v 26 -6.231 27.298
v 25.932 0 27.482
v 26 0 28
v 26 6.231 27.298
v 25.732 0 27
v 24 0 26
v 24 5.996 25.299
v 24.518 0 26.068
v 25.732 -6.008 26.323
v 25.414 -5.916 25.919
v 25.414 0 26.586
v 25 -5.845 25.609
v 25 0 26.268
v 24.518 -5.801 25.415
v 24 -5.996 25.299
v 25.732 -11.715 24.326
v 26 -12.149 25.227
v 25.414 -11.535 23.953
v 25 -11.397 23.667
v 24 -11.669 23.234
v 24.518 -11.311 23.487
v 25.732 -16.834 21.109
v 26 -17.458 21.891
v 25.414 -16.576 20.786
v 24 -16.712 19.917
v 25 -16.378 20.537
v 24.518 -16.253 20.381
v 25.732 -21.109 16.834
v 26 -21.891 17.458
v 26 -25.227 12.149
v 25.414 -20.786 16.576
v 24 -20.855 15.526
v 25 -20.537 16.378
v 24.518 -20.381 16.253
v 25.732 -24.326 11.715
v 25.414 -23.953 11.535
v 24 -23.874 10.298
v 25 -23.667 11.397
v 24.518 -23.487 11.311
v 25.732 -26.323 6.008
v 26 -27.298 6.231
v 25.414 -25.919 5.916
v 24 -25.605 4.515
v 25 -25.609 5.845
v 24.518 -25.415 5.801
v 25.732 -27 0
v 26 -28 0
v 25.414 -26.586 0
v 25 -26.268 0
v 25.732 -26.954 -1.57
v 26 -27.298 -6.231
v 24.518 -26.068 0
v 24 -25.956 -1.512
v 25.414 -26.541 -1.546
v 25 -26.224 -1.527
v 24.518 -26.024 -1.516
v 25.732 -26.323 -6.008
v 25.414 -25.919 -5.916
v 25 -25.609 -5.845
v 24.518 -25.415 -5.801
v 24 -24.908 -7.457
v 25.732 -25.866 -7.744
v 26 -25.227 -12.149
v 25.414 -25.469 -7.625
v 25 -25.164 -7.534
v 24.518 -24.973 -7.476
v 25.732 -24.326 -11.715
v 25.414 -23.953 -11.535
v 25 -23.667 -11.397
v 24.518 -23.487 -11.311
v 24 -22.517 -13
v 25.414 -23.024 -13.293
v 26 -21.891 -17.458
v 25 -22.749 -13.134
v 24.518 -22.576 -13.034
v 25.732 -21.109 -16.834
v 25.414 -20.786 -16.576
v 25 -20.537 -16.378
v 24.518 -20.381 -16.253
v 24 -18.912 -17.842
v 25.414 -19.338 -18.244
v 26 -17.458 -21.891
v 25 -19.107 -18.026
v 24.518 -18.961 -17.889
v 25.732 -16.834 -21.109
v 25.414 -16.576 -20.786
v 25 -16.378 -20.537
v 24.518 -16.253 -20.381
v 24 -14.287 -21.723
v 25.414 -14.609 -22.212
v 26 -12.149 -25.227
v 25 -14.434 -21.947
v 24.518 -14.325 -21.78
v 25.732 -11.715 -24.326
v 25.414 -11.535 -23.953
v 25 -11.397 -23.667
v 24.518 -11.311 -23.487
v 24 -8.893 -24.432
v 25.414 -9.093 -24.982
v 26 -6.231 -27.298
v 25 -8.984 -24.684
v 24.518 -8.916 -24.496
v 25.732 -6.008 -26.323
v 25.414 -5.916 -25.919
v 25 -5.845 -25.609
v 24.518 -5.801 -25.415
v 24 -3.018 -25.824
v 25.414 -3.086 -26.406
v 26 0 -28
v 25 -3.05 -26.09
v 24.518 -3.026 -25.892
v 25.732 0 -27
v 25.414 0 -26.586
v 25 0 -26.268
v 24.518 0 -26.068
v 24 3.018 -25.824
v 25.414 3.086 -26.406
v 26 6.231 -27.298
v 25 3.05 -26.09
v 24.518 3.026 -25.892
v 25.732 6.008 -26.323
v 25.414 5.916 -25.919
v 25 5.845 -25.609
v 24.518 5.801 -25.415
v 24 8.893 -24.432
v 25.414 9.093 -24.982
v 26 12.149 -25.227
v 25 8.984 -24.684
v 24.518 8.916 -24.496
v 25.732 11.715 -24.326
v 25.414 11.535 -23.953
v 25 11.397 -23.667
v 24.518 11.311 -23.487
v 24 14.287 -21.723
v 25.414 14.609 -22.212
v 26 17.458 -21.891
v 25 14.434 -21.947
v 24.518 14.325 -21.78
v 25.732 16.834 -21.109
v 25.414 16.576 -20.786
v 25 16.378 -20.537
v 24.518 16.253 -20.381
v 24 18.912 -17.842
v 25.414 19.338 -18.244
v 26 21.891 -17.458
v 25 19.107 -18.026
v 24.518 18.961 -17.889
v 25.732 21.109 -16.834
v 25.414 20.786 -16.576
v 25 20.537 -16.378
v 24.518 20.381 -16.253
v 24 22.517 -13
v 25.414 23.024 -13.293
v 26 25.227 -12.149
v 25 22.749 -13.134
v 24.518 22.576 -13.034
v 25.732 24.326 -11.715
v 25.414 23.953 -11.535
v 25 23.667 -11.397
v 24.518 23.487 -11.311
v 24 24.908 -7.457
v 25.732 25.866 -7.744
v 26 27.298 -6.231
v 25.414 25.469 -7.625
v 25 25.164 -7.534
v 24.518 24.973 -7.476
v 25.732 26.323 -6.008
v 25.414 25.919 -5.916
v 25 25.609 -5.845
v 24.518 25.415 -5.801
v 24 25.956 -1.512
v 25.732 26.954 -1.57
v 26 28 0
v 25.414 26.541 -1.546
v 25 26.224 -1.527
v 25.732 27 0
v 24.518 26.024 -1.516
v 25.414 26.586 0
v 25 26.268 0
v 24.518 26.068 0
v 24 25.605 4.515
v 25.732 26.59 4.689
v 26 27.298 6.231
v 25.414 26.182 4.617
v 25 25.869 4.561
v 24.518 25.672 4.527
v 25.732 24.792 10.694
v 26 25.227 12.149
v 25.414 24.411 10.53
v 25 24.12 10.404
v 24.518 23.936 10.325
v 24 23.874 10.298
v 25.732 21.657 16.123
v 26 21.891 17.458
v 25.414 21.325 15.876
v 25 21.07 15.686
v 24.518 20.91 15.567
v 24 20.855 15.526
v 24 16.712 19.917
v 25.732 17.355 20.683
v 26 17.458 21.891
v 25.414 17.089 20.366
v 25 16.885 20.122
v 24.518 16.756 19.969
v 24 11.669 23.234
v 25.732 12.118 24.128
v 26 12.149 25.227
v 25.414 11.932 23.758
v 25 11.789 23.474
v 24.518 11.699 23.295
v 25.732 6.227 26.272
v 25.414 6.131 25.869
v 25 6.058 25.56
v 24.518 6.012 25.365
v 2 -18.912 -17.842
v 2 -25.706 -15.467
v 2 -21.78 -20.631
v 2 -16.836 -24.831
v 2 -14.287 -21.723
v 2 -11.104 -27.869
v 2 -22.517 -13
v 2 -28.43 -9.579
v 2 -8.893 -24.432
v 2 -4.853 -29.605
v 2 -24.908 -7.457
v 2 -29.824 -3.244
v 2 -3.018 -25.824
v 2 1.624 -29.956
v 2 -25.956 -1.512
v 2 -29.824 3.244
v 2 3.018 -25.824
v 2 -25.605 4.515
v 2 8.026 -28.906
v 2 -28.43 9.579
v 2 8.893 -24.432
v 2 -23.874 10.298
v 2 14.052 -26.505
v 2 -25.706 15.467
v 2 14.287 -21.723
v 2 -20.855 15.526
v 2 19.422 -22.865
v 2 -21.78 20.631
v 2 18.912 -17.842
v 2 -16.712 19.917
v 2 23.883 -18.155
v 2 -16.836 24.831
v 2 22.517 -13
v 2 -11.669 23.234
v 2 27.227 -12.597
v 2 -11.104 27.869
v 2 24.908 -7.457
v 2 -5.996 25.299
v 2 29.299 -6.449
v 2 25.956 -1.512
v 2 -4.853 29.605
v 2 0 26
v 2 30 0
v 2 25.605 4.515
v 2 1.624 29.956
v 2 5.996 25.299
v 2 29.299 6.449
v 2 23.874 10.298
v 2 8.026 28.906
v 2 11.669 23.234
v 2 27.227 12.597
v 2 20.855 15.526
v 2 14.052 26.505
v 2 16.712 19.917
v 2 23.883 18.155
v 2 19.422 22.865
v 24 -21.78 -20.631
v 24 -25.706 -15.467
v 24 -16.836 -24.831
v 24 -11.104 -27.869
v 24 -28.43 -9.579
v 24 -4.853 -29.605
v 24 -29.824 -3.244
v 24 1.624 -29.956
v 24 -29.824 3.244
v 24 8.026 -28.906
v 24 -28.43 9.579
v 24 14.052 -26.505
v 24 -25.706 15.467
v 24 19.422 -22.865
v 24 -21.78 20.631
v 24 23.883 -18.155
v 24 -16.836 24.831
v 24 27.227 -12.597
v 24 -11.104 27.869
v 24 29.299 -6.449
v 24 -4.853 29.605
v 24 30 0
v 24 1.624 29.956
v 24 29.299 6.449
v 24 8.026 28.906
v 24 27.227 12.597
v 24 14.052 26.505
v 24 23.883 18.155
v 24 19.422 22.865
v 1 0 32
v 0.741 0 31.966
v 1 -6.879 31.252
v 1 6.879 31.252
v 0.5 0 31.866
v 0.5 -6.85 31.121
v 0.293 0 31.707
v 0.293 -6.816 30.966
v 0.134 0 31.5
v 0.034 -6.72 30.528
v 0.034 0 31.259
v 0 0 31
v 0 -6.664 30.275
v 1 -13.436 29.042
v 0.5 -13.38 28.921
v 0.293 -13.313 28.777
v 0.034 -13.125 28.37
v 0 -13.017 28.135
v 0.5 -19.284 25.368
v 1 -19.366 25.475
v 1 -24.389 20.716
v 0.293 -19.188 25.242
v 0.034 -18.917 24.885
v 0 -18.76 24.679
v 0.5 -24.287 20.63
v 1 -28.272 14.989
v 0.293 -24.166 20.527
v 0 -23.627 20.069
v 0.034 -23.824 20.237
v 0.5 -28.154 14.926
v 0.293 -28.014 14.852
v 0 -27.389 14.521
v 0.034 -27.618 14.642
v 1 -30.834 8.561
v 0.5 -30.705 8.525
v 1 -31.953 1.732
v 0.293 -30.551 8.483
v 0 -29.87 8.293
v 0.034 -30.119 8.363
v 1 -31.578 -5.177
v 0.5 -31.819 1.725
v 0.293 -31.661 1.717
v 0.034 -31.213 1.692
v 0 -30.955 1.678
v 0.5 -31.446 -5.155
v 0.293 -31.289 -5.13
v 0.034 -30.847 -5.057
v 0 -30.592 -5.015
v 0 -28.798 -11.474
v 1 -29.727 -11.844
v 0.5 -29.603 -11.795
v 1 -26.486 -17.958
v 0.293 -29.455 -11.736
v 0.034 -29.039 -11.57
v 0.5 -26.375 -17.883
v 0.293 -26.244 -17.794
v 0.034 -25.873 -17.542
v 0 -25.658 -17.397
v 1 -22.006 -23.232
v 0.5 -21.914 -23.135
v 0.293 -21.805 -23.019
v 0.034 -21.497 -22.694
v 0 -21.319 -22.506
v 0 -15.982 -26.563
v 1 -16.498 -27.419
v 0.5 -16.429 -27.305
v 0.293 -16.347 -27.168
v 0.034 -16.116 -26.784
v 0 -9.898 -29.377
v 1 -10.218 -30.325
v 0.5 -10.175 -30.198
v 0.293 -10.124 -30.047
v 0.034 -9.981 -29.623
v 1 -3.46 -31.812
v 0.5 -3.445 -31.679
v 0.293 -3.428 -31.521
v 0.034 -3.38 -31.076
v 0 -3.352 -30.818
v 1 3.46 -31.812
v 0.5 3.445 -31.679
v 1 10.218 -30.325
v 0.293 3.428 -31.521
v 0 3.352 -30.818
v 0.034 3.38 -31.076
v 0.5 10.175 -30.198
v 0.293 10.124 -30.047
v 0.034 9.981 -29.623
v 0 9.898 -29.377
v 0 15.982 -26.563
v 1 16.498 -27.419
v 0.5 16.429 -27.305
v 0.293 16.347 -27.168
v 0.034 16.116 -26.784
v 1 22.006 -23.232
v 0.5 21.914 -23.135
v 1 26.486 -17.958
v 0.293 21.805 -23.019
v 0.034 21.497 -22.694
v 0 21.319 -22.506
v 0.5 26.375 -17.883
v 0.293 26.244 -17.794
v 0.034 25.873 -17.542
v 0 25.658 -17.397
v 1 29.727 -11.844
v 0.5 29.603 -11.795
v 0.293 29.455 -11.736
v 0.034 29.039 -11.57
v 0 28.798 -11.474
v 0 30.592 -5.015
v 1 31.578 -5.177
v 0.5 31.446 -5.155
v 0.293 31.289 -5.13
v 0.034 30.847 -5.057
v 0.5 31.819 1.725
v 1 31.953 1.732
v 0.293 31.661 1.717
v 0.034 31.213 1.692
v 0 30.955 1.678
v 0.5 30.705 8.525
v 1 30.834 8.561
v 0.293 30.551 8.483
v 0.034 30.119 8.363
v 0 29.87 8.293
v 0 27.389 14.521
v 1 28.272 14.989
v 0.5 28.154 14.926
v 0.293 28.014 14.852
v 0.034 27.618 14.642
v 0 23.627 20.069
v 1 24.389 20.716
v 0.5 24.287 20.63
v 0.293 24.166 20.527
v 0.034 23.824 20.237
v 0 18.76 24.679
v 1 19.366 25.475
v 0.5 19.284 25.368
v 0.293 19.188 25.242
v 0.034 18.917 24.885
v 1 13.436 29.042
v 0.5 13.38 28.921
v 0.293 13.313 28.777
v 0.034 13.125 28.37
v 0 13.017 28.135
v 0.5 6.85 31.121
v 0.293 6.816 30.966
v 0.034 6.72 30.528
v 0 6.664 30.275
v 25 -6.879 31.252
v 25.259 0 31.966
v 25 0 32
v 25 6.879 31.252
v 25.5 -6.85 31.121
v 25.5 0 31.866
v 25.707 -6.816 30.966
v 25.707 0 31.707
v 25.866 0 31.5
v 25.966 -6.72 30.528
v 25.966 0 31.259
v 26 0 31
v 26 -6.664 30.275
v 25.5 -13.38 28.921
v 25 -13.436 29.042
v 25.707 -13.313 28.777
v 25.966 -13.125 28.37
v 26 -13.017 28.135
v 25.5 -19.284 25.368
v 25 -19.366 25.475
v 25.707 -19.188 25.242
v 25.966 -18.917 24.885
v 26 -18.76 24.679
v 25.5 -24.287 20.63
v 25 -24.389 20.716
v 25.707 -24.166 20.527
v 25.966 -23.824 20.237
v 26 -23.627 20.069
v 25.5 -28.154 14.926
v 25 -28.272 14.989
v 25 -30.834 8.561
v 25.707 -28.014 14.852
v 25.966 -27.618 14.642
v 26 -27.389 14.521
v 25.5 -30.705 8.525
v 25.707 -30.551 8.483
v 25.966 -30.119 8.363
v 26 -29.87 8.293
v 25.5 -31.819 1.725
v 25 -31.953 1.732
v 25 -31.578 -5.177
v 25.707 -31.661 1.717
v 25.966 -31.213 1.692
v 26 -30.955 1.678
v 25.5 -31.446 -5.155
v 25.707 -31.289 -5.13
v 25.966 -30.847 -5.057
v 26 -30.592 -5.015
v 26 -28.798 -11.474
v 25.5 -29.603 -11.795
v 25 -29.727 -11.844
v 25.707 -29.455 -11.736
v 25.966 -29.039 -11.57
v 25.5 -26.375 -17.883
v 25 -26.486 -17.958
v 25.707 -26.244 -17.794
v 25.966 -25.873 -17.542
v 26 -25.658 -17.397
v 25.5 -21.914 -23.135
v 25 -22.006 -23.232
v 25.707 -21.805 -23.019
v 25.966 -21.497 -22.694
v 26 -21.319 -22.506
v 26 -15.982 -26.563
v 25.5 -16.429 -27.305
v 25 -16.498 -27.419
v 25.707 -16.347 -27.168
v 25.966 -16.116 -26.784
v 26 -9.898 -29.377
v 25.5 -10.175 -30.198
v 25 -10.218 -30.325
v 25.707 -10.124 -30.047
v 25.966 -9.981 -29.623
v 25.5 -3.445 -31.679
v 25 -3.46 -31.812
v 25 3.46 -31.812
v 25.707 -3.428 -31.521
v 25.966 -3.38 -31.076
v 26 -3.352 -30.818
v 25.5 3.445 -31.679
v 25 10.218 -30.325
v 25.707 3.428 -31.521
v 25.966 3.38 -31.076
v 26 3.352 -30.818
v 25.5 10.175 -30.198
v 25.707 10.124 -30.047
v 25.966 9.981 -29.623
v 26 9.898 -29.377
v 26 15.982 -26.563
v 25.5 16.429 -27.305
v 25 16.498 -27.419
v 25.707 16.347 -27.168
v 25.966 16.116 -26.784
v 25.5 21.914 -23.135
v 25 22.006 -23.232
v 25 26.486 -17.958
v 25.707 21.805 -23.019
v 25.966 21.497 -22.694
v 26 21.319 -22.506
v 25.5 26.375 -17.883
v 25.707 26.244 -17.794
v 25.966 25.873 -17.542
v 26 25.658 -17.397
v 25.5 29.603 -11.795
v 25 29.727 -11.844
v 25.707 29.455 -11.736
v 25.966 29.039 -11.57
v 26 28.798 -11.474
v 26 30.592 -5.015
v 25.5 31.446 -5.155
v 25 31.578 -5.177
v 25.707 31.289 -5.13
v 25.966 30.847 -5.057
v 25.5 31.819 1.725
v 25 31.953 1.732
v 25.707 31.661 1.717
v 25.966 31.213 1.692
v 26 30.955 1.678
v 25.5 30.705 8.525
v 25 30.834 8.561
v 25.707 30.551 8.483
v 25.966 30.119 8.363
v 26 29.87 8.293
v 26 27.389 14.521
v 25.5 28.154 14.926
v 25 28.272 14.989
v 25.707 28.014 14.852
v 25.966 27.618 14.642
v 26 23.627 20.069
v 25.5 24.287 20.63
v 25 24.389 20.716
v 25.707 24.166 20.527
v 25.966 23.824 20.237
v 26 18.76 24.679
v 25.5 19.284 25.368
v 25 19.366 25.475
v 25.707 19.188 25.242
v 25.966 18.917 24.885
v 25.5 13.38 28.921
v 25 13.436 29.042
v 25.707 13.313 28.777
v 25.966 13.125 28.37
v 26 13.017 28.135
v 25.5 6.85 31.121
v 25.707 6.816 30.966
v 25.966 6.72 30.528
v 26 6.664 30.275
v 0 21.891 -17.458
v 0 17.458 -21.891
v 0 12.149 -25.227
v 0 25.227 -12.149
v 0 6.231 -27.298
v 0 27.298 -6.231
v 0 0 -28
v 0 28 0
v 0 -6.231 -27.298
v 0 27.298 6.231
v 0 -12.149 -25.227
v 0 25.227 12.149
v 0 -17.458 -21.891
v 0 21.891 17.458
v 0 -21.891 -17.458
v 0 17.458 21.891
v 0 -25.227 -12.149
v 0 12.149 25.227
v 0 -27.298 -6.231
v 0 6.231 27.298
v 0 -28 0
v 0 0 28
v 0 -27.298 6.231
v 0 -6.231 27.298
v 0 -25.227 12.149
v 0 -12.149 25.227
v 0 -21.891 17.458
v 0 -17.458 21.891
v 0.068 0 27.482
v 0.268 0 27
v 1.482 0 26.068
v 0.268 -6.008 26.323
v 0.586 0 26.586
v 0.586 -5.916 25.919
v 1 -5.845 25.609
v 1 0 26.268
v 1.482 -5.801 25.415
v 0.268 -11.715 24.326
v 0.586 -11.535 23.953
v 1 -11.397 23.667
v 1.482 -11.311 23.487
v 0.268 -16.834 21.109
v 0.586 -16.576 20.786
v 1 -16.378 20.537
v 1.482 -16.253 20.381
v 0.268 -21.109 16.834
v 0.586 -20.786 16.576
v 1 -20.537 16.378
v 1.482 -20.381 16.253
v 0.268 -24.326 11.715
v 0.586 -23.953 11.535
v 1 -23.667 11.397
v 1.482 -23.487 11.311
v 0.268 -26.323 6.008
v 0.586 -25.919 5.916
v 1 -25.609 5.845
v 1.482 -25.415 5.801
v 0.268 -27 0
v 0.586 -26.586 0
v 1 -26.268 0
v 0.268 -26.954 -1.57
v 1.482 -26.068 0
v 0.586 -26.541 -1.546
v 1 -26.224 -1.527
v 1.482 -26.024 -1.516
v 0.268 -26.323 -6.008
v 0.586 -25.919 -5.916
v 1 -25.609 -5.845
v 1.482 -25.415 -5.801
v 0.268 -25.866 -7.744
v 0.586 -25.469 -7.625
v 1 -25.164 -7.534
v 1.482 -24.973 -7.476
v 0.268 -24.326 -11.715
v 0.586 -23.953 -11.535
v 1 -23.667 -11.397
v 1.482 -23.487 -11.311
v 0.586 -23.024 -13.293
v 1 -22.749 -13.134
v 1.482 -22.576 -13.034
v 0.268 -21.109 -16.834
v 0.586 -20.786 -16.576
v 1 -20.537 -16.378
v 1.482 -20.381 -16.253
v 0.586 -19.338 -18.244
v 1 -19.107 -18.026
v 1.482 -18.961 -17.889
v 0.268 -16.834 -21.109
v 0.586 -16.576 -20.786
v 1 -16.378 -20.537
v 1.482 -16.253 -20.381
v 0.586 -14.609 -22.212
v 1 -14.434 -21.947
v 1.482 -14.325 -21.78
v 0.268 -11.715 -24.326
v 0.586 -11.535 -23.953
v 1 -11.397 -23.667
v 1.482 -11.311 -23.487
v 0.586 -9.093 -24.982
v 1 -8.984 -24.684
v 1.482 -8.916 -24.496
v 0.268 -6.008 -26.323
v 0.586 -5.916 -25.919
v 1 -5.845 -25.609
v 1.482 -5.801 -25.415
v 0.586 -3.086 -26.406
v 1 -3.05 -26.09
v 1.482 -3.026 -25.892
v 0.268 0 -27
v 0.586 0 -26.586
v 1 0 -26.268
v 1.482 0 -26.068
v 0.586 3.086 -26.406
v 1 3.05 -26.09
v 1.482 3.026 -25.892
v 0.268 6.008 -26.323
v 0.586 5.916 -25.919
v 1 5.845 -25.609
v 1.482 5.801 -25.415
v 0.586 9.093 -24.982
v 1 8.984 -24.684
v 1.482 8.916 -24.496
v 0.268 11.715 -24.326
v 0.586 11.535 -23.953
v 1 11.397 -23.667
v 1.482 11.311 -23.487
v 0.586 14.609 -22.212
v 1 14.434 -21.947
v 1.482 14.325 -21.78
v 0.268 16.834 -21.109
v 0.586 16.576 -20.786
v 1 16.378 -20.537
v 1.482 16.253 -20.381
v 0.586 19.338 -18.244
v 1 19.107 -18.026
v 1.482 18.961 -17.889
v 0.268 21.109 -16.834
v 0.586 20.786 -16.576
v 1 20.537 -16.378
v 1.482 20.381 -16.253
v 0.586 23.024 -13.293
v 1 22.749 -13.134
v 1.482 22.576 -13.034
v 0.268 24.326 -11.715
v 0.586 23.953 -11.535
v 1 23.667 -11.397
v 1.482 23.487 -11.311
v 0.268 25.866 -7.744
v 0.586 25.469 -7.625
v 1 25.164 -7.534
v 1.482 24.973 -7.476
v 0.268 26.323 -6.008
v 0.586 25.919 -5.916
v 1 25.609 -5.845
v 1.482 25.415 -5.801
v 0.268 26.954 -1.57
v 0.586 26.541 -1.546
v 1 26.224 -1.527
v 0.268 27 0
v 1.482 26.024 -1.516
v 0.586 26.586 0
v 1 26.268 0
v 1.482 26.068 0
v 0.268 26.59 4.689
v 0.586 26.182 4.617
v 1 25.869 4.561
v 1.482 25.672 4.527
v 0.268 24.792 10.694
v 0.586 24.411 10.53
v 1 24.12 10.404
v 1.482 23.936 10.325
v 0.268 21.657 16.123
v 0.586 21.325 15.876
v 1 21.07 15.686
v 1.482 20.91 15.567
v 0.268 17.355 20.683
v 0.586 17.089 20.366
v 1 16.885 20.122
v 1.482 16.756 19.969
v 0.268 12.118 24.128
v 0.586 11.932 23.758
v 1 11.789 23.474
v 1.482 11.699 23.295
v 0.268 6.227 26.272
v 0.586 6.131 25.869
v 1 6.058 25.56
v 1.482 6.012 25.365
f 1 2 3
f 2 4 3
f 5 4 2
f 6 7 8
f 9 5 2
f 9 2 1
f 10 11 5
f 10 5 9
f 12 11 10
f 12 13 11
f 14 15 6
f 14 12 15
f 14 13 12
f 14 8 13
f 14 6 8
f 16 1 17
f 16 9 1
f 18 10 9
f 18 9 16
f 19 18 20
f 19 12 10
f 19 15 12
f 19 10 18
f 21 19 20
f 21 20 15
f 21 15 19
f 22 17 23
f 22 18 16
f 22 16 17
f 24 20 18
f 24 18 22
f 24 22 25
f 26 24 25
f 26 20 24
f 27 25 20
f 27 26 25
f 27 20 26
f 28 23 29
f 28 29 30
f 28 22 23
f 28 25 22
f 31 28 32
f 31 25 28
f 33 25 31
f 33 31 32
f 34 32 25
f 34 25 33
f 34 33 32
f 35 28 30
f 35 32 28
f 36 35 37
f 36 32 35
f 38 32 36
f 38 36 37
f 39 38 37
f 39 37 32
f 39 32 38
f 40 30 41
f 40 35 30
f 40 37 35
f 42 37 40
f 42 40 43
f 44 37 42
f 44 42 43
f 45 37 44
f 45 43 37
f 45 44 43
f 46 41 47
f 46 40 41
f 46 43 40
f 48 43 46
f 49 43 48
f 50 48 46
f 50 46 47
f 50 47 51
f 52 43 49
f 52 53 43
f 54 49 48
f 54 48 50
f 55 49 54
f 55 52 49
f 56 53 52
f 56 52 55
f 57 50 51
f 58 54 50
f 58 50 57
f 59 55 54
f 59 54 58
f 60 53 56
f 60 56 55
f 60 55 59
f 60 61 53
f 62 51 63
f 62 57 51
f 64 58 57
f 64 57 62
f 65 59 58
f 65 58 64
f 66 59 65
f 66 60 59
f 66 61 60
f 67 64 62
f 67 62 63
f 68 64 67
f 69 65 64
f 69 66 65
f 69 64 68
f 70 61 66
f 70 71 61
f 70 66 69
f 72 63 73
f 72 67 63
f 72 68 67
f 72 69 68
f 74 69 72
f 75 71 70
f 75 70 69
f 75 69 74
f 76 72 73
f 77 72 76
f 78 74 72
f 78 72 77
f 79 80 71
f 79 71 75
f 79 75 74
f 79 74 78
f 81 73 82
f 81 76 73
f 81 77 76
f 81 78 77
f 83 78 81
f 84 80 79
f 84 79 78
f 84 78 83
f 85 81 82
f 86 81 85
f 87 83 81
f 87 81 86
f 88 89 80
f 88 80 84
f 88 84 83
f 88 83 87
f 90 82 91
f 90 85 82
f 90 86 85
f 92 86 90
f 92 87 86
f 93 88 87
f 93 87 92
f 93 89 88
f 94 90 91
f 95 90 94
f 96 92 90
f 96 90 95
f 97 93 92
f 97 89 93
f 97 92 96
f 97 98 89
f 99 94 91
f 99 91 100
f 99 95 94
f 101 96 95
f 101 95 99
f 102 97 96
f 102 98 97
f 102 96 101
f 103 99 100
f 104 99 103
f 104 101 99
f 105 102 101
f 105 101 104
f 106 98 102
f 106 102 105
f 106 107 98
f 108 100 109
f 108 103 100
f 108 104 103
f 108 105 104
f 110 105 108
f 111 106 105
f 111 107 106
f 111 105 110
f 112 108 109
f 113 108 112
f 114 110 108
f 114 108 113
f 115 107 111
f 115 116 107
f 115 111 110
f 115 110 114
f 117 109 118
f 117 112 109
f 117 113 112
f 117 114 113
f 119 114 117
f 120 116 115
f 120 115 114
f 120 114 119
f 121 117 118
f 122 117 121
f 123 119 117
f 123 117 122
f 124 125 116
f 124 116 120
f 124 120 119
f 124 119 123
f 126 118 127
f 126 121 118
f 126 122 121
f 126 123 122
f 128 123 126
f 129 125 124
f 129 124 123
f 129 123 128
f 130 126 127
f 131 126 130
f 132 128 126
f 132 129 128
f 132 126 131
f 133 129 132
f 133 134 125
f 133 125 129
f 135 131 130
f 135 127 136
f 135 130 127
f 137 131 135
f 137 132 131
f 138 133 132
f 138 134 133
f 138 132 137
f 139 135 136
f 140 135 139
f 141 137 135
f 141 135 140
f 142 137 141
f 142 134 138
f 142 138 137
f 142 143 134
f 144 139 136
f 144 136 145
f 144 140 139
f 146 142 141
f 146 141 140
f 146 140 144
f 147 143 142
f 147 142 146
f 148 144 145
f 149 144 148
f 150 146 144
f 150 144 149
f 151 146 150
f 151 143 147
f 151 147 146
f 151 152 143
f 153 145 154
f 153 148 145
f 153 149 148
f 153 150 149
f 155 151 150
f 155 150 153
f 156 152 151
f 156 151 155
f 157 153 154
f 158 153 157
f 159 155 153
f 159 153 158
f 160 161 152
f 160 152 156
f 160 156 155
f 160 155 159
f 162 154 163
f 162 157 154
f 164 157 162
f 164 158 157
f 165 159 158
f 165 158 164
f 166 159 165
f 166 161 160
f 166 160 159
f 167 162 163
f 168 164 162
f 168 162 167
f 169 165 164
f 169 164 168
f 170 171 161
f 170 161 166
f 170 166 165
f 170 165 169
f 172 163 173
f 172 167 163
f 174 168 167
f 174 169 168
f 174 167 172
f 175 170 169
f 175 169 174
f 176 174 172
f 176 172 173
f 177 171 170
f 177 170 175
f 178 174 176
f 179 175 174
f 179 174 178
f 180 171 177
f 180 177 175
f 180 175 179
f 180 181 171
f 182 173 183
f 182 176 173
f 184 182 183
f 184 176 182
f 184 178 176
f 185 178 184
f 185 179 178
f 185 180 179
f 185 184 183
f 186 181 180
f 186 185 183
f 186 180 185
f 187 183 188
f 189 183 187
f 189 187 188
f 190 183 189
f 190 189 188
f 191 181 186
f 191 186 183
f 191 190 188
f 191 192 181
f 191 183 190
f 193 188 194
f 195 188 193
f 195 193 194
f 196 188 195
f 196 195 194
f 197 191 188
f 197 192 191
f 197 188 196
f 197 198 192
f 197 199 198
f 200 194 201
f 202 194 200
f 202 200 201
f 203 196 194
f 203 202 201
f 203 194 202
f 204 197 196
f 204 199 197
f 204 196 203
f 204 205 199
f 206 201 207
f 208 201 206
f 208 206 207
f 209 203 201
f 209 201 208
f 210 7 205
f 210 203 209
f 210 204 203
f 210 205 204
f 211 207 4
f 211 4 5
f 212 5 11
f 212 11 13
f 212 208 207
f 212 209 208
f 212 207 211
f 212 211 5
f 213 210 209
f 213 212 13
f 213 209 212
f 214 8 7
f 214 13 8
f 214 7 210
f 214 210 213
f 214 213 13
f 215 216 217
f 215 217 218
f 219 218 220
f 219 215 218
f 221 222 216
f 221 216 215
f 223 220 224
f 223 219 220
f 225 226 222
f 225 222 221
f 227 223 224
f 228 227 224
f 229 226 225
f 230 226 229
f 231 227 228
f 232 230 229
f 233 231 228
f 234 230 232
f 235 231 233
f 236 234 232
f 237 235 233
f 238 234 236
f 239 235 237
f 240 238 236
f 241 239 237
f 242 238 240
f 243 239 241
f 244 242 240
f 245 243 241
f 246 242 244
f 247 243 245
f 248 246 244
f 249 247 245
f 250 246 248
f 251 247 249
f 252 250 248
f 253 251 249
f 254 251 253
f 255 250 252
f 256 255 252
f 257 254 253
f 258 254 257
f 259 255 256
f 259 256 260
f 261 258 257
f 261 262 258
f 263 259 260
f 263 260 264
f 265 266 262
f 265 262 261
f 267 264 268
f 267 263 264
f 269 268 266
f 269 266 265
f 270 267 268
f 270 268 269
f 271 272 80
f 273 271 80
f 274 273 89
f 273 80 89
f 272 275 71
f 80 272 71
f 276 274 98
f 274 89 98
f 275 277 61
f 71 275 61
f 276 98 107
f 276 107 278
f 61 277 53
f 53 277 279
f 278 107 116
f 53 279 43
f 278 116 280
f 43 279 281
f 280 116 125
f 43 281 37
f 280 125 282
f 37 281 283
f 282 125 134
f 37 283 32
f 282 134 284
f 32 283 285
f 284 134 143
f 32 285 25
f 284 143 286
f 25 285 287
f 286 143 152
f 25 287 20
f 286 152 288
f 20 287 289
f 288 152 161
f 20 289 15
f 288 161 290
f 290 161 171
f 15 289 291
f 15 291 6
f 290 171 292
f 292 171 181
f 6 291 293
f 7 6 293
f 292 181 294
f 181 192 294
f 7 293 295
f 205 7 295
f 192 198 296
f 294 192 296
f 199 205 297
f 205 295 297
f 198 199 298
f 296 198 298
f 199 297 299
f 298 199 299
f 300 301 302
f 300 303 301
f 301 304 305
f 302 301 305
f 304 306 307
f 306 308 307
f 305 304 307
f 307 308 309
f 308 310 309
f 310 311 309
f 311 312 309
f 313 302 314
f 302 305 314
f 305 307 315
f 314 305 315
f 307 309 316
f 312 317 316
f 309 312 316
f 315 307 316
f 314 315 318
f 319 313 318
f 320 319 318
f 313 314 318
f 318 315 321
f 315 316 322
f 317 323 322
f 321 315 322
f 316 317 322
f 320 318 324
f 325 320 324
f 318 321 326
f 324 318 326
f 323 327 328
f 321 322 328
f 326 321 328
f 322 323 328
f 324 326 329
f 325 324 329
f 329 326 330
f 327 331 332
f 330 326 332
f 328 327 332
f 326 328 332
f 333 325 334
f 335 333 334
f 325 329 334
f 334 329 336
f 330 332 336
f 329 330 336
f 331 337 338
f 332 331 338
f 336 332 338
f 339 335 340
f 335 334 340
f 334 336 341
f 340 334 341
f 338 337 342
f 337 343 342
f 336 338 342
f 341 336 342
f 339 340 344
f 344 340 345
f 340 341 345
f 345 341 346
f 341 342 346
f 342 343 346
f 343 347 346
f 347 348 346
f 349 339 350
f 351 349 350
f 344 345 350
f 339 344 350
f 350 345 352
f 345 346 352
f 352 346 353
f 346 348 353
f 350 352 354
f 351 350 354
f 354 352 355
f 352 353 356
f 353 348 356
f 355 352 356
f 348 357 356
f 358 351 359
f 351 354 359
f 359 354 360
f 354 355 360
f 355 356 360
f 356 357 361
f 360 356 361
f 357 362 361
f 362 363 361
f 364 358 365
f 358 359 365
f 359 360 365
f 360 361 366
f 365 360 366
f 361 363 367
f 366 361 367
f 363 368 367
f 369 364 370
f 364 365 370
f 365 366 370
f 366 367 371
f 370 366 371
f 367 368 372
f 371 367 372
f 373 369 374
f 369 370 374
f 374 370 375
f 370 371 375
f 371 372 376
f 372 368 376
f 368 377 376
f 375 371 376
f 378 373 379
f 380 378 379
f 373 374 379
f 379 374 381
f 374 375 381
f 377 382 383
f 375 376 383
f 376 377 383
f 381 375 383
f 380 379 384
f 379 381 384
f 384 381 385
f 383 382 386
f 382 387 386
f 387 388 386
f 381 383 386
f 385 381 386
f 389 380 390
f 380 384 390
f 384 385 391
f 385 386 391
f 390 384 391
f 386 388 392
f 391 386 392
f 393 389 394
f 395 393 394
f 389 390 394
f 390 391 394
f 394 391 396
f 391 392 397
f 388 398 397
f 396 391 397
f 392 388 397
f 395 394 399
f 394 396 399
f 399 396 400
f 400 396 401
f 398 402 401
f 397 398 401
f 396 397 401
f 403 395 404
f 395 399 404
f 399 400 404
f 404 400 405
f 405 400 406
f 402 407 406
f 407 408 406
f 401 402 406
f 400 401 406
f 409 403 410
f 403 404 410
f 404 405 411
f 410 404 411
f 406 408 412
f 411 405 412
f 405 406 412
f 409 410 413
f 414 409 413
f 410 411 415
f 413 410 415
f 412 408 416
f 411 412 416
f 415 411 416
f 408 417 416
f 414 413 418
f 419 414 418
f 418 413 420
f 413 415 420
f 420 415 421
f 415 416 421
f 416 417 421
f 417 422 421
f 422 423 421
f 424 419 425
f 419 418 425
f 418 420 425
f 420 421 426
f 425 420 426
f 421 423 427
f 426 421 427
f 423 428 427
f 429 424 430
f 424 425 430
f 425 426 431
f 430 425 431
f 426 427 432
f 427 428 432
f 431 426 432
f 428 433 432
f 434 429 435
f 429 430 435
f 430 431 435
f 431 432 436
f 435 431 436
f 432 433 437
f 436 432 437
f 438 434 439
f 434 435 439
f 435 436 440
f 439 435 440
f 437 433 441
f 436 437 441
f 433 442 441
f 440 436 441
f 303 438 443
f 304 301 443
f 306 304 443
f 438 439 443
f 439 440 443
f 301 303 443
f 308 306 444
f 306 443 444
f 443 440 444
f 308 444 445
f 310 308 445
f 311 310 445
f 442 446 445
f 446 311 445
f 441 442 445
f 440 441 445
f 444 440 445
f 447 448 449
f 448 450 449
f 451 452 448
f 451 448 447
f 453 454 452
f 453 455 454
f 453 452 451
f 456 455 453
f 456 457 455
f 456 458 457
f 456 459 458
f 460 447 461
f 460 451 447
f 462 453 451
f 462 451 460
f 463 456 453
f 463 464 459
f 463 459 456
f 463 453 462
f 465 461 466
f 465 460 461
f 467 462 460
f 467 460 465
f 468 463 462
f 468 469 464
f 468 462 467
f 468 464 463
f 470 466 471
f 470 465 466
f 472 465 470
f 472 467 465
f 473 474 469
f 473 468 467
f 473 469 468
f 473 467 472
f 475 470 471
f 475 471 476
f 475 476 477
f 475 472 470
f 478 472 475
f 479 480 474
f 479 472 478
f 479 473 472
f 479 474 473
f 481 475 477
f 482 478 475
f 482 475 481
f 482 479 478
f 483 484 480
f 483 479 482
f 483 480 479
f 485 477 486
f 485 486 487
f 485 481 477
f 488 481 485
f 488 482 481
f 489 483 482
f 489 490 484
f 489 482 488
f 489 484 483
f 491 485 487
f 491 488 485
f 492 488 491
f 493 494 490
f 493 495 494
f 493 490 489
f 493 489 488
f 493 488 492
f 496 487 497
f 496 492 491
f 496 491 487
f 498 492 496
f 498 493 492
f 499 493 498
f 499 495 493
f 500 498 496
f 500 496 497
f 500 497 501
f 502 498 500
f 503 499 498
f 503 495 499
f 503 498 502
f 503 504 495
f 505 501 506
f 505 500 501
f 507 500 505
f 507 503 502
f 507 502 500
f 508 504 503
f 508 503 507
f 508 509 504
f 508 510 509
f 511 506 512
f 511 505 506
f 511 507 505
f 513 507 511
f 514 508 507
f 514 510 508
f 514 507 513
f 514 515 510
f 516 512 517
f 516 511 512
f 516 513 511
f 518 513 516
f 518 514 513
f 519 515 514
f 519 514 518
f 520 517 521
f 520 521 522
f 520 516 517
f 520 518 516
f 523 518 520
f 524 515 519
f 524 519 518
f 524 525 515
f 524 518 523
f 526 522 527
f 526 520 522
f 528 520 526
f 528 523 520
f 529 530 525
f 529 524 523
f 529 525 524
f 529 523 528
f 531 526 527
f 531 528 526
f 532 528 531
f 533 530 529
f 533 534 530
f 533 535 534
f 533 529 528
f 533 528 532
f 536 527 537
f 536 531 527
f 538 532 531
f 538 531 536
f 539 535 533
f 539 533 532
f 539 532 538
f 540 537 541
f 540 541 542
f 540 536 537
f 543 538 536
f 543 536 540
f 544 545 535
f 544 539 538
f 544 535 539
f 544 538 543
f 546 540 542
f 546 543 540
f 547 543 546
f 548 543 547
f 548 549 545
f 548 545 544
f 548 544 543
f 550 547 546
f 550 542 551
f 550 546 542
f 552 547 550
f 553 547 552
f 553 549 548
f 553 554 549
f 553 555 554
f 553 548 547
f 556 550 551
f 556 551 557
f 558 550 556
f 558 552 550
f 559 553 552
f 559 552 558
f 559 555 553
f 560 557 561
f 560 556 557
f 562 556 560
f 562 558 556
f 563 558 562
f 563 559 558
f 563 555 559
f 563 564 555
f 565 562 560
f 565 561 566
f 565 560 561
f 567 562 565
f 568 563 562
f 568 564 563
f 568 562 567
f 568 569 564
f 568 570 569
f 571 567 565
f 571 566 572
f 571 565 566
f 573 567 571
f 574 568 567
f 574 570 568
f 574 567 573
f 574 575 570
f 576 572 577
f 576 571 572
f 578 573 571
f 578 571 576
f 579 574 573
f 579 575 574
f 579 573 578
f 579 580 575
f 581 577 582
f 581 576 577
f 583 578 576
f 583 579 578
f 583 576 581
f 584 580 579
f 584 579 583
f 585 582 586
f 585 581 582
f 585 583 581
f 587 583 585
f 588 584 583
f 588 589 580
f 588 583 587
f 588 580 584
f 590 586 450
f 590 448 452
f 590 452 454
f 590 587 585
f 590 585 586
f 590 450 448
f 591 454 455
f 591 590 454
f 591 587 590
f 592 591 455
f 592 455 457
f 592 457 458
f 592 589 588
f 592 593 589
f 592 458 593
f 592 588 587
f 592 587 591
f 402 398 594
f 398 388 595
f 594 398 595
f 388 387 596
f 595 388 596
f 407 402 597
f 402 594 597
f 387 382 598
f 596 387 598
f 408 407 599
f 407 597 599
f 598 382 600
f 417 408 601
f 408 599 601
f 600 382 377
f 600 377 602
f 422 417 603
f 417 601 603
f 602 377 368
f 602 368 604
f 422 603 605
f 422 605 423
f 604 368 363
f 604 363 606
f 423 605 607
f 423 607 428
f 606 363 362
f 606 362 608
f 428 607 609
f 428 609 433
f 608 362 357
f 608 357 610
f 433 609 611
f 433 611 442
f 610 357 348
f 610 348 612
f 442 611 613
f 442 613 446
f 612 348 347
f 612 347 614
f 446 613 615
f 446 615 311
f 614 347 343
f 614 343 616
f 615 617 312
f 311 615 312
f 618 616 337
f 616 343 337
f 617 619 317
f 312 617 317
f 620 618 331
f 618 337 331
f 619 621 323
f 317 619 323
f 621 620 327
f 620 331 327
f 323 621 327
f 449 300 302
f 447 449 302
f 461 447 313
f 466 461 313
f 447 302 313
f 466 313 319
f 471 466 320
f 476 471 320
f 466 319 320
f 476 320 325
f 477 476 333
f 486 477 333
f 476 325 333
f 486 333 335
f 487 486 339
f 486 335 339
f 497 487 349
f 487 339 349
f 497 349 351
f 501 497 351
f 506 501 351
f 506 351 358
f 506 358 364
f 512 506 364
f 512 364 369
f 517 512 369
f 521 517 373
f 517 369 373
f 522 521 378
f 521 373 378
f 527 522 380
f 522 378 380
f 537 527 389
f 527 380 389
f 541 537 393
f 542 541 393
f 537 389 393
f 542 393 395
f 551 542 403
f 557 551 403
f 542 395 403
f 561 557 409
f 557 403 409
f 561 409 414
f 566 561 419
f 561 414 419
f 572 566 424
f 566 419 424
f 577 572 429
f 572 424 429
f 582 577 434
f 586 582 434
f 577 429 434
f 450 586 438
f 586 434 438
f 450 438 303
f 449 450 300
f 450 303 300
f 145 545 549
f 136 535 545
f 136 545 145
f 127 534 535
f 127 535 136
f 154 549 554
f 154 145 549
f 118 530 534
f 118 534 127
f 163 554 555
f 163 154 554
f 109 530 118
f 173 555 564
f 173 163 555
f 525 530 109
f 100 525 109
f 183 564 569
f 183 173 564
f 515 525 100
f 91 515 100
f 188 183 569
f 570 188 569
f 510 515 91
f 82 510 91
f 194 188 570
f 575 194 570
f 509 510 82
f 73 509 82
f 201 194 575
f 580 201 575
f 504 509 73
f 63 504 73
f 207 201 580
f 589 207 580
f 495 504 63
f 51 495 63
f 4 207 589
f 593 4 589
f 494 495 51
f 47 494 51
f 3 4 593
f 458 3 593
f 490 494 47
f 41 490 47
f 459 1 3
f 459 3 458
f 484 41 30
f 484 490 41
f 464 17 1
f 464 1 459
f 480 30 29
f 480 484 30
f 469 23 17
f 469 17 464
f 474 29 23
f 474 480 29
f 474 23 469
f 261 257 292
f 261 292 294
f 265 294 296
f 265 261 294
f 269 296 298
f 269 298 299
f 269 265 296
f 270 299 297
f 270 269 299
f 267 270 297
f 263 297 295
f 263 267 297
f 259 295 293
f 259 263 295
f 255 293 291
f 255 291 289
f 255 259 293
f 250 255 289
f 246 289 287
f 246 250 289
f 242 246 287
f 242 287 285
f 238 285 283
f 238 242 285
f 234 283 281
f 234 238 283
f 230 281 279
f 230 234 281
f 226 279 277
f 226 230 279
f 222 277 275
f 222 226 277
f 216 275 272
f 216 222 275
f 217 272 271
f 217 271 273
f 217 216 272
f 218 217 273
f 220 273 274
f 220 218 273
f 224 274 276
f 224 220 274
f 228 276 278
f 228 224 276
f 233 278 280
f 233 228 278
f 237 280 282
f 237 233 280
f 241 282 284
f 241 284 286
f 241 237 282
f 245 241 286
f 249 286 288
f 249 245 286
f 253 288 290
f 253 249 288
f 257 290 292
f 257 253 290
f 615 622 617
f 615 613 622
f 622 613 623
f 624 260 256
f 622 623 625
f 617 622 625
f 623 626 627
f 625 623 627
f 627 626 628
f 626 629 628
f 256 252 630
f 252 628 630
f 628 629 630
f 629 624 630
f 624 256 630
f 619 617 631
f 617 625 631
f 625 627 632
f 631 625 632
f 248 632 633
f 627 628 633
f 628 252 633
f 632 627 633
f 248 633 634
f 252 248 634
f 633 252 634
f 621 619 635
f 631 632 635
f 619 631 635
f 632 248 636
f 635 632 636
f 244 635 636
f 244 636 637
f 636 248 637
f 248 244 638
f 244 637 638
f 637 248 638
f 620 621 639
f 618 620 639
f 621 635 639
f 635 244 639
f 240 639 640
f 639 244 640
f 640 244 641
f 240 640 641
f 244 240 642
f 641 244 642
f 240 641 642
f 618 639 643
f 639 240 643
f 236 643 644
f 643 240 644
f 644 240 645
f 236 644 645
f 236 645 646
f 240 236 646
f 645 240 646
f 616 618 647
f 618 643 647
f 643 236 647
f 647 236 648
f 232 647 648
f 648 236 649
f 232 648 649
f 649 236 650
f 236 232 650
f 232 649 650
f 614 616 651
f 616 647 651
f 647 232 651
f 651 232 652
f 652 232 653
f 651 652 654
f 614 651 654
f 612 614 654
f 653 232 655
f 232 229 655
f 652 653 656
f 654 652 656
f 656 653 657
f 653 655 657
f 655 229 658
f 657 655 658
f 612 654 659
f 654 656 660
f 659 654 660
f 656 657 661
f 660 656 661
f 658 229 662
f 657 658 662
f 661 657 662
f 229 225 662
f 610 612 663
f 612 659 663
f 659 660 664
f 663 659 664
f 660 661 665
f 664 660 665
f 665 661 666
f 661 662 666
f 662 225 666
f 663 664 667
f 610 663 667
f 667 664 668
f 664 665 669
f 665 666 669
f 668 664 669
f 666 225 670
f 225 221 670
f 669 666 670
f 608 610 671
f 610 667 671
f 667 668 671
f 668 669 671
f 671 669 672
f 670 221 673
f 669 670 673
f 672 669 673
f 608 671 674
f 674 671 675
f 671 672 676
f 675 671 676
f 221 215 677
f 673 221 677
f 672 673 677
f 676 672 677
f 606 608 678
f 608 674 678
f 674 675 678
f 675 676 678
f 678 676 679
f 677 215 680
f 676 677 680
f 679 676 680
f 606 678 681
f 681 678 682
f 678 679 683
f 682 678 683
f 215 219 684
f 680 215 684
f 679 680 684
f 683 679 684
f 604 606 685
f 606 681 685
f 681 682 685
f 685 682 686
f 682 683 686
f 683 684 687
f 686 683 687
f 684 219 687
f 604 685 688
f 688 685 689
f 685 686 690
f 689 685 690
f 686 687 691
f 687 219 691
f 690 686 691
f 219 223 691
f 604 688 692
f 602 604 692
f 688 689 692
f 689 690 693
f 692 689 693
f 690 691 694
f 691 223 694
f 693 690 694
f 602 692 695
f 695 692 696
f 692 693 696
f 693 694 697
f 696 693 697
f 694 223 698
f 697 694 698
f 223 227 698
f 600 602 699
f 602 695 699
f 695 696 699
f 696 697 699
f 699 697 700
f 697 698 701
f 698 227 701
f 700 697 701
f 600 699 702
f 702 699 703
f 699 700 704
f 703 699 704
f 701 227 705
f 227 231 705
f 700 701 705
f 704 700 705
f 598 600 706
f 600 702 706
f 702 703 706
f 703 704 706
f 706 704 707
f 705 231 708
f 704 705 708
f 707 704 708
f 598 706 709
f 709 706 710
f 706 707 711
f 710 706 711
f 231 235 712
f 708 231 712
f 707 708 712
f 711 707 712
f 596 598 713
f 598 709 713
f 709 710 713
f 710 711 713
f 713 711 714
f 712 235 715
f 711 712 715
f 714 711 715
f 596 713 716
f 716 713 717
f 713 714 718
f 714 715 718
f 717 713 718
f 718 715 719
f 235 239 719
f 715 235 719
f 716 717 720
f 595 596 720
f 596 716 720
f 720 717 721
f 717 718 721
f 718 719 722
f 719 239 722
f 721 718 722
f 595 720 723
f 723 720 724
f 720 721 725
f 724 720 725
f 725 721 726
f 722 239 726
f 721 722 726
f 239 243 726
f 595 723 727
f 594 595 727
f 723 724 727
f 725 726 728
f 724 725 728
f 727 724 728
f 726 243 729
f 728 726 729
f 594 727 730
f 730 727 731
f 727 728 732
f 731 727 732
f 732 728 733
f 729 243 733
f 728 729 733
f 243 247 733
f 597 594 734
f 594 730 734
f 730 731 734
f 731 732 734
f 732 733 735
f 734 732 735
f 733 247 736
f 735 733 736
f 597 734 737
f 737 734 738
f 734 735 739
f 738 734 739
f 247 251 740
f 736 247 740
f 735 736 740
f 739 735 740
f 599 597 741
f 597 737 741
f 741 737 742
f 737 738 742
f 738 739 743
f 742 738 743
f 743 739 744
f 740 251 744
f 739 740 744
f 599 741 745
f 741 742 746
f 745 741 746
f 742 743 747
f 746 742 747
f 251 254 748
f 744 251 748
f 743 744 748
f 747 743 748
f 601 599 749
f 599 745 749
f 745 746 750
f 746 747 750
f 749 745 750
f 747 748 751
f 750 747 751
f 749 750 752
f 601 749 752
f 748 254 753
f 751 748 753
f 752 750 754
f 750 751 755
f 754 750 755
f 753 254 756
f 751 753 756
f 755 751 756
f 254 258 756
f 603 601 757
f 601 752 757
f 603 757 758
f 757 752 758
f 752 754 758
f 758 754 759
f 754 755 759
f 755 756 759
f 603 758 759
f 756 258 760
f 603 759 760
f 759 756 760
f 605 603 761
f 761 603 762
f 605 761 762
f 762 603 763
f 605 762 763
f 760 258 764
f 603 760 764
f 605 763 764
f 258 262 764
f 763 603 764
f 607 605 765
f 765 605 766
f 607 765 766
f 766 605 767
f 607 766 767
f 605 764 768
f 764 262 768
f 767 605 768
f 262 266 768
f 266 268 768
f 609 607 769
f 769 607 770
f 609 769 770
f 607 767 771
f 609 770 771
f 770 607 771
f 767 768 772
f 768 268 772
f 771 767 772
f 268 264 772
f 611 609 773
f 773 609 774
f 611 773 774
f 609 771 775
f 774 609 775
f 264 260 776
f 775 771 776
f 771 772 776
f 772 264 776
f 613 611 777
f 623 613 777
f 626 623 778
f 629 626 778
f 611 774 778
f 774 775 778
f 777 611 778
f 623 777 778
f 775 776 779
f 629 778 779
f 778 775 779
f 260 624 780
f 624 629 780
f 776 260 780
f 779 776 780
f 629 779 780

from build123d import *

# Parameters (mm, degrees)
SKETCH1_R           = 32
SKETCH1_R_2         = 26
BOSS_EXTRUDE1_DEPTH = 26
FILLET1_R           = 1
FILLET2_R           = 2
SHELL1_START        = 2
SHELL1_OUTLINE_R    = 30
SHELL1_OUTLINE_R_2  = 26
SHELL1_DEPTH        = 22


# Read off the part's stored shape, not the designer's step: Shell1
with BuildPart() as part:
    # Sketch1 → Boss-Extrude1 (new body)
    with BuildSketch(Plane(origin=(0, 0, 0), x_dir=(0, 0, -1), z_dir=(1, 0, 0))):
        with Locations(Location((0, 0, 0), (0, 0, 180))):
            Circle(SKETCH1_R)
        with Locations(Location((0, 0, 0), (0, 0, 180))):
            Circle(SKETCH1_R_2, mode=Mode.SUBTRACT)
    extrude(amount=BOSS_EXTRUDE1_DEPTH)

    # Fillet1
    fillet1_edges = [part.edges().sort_by_distance(p)[0] for p in [
        (0, 0, -32),
        (26, 0, -32),
    ]]
    fillet(fillet1_edges, radius=FILLET1_R)

    # Fillet2
    fillet2_edges = [part.edges().sort_by_distance(p)[0] for p in [
        (0, 0, -26),
        (26, 0, -26),
    ]]
    fillet(fillet2_edges, radius=FILLET2_R)

    # Shell1 outline → Shell1 (cut)
    with BuildSketch(Plane.YZ.offset(SHELL1_START)):
        Circle(SHELL1_OUTLINE_R)
        Circle(SHELL1_OUTLINE_R_2, mode=Mode.SUBTRACT)
    extrude(amount=SHELL1_DEPTH, mode=Mode.SUBTRACT)


solid = part.part
